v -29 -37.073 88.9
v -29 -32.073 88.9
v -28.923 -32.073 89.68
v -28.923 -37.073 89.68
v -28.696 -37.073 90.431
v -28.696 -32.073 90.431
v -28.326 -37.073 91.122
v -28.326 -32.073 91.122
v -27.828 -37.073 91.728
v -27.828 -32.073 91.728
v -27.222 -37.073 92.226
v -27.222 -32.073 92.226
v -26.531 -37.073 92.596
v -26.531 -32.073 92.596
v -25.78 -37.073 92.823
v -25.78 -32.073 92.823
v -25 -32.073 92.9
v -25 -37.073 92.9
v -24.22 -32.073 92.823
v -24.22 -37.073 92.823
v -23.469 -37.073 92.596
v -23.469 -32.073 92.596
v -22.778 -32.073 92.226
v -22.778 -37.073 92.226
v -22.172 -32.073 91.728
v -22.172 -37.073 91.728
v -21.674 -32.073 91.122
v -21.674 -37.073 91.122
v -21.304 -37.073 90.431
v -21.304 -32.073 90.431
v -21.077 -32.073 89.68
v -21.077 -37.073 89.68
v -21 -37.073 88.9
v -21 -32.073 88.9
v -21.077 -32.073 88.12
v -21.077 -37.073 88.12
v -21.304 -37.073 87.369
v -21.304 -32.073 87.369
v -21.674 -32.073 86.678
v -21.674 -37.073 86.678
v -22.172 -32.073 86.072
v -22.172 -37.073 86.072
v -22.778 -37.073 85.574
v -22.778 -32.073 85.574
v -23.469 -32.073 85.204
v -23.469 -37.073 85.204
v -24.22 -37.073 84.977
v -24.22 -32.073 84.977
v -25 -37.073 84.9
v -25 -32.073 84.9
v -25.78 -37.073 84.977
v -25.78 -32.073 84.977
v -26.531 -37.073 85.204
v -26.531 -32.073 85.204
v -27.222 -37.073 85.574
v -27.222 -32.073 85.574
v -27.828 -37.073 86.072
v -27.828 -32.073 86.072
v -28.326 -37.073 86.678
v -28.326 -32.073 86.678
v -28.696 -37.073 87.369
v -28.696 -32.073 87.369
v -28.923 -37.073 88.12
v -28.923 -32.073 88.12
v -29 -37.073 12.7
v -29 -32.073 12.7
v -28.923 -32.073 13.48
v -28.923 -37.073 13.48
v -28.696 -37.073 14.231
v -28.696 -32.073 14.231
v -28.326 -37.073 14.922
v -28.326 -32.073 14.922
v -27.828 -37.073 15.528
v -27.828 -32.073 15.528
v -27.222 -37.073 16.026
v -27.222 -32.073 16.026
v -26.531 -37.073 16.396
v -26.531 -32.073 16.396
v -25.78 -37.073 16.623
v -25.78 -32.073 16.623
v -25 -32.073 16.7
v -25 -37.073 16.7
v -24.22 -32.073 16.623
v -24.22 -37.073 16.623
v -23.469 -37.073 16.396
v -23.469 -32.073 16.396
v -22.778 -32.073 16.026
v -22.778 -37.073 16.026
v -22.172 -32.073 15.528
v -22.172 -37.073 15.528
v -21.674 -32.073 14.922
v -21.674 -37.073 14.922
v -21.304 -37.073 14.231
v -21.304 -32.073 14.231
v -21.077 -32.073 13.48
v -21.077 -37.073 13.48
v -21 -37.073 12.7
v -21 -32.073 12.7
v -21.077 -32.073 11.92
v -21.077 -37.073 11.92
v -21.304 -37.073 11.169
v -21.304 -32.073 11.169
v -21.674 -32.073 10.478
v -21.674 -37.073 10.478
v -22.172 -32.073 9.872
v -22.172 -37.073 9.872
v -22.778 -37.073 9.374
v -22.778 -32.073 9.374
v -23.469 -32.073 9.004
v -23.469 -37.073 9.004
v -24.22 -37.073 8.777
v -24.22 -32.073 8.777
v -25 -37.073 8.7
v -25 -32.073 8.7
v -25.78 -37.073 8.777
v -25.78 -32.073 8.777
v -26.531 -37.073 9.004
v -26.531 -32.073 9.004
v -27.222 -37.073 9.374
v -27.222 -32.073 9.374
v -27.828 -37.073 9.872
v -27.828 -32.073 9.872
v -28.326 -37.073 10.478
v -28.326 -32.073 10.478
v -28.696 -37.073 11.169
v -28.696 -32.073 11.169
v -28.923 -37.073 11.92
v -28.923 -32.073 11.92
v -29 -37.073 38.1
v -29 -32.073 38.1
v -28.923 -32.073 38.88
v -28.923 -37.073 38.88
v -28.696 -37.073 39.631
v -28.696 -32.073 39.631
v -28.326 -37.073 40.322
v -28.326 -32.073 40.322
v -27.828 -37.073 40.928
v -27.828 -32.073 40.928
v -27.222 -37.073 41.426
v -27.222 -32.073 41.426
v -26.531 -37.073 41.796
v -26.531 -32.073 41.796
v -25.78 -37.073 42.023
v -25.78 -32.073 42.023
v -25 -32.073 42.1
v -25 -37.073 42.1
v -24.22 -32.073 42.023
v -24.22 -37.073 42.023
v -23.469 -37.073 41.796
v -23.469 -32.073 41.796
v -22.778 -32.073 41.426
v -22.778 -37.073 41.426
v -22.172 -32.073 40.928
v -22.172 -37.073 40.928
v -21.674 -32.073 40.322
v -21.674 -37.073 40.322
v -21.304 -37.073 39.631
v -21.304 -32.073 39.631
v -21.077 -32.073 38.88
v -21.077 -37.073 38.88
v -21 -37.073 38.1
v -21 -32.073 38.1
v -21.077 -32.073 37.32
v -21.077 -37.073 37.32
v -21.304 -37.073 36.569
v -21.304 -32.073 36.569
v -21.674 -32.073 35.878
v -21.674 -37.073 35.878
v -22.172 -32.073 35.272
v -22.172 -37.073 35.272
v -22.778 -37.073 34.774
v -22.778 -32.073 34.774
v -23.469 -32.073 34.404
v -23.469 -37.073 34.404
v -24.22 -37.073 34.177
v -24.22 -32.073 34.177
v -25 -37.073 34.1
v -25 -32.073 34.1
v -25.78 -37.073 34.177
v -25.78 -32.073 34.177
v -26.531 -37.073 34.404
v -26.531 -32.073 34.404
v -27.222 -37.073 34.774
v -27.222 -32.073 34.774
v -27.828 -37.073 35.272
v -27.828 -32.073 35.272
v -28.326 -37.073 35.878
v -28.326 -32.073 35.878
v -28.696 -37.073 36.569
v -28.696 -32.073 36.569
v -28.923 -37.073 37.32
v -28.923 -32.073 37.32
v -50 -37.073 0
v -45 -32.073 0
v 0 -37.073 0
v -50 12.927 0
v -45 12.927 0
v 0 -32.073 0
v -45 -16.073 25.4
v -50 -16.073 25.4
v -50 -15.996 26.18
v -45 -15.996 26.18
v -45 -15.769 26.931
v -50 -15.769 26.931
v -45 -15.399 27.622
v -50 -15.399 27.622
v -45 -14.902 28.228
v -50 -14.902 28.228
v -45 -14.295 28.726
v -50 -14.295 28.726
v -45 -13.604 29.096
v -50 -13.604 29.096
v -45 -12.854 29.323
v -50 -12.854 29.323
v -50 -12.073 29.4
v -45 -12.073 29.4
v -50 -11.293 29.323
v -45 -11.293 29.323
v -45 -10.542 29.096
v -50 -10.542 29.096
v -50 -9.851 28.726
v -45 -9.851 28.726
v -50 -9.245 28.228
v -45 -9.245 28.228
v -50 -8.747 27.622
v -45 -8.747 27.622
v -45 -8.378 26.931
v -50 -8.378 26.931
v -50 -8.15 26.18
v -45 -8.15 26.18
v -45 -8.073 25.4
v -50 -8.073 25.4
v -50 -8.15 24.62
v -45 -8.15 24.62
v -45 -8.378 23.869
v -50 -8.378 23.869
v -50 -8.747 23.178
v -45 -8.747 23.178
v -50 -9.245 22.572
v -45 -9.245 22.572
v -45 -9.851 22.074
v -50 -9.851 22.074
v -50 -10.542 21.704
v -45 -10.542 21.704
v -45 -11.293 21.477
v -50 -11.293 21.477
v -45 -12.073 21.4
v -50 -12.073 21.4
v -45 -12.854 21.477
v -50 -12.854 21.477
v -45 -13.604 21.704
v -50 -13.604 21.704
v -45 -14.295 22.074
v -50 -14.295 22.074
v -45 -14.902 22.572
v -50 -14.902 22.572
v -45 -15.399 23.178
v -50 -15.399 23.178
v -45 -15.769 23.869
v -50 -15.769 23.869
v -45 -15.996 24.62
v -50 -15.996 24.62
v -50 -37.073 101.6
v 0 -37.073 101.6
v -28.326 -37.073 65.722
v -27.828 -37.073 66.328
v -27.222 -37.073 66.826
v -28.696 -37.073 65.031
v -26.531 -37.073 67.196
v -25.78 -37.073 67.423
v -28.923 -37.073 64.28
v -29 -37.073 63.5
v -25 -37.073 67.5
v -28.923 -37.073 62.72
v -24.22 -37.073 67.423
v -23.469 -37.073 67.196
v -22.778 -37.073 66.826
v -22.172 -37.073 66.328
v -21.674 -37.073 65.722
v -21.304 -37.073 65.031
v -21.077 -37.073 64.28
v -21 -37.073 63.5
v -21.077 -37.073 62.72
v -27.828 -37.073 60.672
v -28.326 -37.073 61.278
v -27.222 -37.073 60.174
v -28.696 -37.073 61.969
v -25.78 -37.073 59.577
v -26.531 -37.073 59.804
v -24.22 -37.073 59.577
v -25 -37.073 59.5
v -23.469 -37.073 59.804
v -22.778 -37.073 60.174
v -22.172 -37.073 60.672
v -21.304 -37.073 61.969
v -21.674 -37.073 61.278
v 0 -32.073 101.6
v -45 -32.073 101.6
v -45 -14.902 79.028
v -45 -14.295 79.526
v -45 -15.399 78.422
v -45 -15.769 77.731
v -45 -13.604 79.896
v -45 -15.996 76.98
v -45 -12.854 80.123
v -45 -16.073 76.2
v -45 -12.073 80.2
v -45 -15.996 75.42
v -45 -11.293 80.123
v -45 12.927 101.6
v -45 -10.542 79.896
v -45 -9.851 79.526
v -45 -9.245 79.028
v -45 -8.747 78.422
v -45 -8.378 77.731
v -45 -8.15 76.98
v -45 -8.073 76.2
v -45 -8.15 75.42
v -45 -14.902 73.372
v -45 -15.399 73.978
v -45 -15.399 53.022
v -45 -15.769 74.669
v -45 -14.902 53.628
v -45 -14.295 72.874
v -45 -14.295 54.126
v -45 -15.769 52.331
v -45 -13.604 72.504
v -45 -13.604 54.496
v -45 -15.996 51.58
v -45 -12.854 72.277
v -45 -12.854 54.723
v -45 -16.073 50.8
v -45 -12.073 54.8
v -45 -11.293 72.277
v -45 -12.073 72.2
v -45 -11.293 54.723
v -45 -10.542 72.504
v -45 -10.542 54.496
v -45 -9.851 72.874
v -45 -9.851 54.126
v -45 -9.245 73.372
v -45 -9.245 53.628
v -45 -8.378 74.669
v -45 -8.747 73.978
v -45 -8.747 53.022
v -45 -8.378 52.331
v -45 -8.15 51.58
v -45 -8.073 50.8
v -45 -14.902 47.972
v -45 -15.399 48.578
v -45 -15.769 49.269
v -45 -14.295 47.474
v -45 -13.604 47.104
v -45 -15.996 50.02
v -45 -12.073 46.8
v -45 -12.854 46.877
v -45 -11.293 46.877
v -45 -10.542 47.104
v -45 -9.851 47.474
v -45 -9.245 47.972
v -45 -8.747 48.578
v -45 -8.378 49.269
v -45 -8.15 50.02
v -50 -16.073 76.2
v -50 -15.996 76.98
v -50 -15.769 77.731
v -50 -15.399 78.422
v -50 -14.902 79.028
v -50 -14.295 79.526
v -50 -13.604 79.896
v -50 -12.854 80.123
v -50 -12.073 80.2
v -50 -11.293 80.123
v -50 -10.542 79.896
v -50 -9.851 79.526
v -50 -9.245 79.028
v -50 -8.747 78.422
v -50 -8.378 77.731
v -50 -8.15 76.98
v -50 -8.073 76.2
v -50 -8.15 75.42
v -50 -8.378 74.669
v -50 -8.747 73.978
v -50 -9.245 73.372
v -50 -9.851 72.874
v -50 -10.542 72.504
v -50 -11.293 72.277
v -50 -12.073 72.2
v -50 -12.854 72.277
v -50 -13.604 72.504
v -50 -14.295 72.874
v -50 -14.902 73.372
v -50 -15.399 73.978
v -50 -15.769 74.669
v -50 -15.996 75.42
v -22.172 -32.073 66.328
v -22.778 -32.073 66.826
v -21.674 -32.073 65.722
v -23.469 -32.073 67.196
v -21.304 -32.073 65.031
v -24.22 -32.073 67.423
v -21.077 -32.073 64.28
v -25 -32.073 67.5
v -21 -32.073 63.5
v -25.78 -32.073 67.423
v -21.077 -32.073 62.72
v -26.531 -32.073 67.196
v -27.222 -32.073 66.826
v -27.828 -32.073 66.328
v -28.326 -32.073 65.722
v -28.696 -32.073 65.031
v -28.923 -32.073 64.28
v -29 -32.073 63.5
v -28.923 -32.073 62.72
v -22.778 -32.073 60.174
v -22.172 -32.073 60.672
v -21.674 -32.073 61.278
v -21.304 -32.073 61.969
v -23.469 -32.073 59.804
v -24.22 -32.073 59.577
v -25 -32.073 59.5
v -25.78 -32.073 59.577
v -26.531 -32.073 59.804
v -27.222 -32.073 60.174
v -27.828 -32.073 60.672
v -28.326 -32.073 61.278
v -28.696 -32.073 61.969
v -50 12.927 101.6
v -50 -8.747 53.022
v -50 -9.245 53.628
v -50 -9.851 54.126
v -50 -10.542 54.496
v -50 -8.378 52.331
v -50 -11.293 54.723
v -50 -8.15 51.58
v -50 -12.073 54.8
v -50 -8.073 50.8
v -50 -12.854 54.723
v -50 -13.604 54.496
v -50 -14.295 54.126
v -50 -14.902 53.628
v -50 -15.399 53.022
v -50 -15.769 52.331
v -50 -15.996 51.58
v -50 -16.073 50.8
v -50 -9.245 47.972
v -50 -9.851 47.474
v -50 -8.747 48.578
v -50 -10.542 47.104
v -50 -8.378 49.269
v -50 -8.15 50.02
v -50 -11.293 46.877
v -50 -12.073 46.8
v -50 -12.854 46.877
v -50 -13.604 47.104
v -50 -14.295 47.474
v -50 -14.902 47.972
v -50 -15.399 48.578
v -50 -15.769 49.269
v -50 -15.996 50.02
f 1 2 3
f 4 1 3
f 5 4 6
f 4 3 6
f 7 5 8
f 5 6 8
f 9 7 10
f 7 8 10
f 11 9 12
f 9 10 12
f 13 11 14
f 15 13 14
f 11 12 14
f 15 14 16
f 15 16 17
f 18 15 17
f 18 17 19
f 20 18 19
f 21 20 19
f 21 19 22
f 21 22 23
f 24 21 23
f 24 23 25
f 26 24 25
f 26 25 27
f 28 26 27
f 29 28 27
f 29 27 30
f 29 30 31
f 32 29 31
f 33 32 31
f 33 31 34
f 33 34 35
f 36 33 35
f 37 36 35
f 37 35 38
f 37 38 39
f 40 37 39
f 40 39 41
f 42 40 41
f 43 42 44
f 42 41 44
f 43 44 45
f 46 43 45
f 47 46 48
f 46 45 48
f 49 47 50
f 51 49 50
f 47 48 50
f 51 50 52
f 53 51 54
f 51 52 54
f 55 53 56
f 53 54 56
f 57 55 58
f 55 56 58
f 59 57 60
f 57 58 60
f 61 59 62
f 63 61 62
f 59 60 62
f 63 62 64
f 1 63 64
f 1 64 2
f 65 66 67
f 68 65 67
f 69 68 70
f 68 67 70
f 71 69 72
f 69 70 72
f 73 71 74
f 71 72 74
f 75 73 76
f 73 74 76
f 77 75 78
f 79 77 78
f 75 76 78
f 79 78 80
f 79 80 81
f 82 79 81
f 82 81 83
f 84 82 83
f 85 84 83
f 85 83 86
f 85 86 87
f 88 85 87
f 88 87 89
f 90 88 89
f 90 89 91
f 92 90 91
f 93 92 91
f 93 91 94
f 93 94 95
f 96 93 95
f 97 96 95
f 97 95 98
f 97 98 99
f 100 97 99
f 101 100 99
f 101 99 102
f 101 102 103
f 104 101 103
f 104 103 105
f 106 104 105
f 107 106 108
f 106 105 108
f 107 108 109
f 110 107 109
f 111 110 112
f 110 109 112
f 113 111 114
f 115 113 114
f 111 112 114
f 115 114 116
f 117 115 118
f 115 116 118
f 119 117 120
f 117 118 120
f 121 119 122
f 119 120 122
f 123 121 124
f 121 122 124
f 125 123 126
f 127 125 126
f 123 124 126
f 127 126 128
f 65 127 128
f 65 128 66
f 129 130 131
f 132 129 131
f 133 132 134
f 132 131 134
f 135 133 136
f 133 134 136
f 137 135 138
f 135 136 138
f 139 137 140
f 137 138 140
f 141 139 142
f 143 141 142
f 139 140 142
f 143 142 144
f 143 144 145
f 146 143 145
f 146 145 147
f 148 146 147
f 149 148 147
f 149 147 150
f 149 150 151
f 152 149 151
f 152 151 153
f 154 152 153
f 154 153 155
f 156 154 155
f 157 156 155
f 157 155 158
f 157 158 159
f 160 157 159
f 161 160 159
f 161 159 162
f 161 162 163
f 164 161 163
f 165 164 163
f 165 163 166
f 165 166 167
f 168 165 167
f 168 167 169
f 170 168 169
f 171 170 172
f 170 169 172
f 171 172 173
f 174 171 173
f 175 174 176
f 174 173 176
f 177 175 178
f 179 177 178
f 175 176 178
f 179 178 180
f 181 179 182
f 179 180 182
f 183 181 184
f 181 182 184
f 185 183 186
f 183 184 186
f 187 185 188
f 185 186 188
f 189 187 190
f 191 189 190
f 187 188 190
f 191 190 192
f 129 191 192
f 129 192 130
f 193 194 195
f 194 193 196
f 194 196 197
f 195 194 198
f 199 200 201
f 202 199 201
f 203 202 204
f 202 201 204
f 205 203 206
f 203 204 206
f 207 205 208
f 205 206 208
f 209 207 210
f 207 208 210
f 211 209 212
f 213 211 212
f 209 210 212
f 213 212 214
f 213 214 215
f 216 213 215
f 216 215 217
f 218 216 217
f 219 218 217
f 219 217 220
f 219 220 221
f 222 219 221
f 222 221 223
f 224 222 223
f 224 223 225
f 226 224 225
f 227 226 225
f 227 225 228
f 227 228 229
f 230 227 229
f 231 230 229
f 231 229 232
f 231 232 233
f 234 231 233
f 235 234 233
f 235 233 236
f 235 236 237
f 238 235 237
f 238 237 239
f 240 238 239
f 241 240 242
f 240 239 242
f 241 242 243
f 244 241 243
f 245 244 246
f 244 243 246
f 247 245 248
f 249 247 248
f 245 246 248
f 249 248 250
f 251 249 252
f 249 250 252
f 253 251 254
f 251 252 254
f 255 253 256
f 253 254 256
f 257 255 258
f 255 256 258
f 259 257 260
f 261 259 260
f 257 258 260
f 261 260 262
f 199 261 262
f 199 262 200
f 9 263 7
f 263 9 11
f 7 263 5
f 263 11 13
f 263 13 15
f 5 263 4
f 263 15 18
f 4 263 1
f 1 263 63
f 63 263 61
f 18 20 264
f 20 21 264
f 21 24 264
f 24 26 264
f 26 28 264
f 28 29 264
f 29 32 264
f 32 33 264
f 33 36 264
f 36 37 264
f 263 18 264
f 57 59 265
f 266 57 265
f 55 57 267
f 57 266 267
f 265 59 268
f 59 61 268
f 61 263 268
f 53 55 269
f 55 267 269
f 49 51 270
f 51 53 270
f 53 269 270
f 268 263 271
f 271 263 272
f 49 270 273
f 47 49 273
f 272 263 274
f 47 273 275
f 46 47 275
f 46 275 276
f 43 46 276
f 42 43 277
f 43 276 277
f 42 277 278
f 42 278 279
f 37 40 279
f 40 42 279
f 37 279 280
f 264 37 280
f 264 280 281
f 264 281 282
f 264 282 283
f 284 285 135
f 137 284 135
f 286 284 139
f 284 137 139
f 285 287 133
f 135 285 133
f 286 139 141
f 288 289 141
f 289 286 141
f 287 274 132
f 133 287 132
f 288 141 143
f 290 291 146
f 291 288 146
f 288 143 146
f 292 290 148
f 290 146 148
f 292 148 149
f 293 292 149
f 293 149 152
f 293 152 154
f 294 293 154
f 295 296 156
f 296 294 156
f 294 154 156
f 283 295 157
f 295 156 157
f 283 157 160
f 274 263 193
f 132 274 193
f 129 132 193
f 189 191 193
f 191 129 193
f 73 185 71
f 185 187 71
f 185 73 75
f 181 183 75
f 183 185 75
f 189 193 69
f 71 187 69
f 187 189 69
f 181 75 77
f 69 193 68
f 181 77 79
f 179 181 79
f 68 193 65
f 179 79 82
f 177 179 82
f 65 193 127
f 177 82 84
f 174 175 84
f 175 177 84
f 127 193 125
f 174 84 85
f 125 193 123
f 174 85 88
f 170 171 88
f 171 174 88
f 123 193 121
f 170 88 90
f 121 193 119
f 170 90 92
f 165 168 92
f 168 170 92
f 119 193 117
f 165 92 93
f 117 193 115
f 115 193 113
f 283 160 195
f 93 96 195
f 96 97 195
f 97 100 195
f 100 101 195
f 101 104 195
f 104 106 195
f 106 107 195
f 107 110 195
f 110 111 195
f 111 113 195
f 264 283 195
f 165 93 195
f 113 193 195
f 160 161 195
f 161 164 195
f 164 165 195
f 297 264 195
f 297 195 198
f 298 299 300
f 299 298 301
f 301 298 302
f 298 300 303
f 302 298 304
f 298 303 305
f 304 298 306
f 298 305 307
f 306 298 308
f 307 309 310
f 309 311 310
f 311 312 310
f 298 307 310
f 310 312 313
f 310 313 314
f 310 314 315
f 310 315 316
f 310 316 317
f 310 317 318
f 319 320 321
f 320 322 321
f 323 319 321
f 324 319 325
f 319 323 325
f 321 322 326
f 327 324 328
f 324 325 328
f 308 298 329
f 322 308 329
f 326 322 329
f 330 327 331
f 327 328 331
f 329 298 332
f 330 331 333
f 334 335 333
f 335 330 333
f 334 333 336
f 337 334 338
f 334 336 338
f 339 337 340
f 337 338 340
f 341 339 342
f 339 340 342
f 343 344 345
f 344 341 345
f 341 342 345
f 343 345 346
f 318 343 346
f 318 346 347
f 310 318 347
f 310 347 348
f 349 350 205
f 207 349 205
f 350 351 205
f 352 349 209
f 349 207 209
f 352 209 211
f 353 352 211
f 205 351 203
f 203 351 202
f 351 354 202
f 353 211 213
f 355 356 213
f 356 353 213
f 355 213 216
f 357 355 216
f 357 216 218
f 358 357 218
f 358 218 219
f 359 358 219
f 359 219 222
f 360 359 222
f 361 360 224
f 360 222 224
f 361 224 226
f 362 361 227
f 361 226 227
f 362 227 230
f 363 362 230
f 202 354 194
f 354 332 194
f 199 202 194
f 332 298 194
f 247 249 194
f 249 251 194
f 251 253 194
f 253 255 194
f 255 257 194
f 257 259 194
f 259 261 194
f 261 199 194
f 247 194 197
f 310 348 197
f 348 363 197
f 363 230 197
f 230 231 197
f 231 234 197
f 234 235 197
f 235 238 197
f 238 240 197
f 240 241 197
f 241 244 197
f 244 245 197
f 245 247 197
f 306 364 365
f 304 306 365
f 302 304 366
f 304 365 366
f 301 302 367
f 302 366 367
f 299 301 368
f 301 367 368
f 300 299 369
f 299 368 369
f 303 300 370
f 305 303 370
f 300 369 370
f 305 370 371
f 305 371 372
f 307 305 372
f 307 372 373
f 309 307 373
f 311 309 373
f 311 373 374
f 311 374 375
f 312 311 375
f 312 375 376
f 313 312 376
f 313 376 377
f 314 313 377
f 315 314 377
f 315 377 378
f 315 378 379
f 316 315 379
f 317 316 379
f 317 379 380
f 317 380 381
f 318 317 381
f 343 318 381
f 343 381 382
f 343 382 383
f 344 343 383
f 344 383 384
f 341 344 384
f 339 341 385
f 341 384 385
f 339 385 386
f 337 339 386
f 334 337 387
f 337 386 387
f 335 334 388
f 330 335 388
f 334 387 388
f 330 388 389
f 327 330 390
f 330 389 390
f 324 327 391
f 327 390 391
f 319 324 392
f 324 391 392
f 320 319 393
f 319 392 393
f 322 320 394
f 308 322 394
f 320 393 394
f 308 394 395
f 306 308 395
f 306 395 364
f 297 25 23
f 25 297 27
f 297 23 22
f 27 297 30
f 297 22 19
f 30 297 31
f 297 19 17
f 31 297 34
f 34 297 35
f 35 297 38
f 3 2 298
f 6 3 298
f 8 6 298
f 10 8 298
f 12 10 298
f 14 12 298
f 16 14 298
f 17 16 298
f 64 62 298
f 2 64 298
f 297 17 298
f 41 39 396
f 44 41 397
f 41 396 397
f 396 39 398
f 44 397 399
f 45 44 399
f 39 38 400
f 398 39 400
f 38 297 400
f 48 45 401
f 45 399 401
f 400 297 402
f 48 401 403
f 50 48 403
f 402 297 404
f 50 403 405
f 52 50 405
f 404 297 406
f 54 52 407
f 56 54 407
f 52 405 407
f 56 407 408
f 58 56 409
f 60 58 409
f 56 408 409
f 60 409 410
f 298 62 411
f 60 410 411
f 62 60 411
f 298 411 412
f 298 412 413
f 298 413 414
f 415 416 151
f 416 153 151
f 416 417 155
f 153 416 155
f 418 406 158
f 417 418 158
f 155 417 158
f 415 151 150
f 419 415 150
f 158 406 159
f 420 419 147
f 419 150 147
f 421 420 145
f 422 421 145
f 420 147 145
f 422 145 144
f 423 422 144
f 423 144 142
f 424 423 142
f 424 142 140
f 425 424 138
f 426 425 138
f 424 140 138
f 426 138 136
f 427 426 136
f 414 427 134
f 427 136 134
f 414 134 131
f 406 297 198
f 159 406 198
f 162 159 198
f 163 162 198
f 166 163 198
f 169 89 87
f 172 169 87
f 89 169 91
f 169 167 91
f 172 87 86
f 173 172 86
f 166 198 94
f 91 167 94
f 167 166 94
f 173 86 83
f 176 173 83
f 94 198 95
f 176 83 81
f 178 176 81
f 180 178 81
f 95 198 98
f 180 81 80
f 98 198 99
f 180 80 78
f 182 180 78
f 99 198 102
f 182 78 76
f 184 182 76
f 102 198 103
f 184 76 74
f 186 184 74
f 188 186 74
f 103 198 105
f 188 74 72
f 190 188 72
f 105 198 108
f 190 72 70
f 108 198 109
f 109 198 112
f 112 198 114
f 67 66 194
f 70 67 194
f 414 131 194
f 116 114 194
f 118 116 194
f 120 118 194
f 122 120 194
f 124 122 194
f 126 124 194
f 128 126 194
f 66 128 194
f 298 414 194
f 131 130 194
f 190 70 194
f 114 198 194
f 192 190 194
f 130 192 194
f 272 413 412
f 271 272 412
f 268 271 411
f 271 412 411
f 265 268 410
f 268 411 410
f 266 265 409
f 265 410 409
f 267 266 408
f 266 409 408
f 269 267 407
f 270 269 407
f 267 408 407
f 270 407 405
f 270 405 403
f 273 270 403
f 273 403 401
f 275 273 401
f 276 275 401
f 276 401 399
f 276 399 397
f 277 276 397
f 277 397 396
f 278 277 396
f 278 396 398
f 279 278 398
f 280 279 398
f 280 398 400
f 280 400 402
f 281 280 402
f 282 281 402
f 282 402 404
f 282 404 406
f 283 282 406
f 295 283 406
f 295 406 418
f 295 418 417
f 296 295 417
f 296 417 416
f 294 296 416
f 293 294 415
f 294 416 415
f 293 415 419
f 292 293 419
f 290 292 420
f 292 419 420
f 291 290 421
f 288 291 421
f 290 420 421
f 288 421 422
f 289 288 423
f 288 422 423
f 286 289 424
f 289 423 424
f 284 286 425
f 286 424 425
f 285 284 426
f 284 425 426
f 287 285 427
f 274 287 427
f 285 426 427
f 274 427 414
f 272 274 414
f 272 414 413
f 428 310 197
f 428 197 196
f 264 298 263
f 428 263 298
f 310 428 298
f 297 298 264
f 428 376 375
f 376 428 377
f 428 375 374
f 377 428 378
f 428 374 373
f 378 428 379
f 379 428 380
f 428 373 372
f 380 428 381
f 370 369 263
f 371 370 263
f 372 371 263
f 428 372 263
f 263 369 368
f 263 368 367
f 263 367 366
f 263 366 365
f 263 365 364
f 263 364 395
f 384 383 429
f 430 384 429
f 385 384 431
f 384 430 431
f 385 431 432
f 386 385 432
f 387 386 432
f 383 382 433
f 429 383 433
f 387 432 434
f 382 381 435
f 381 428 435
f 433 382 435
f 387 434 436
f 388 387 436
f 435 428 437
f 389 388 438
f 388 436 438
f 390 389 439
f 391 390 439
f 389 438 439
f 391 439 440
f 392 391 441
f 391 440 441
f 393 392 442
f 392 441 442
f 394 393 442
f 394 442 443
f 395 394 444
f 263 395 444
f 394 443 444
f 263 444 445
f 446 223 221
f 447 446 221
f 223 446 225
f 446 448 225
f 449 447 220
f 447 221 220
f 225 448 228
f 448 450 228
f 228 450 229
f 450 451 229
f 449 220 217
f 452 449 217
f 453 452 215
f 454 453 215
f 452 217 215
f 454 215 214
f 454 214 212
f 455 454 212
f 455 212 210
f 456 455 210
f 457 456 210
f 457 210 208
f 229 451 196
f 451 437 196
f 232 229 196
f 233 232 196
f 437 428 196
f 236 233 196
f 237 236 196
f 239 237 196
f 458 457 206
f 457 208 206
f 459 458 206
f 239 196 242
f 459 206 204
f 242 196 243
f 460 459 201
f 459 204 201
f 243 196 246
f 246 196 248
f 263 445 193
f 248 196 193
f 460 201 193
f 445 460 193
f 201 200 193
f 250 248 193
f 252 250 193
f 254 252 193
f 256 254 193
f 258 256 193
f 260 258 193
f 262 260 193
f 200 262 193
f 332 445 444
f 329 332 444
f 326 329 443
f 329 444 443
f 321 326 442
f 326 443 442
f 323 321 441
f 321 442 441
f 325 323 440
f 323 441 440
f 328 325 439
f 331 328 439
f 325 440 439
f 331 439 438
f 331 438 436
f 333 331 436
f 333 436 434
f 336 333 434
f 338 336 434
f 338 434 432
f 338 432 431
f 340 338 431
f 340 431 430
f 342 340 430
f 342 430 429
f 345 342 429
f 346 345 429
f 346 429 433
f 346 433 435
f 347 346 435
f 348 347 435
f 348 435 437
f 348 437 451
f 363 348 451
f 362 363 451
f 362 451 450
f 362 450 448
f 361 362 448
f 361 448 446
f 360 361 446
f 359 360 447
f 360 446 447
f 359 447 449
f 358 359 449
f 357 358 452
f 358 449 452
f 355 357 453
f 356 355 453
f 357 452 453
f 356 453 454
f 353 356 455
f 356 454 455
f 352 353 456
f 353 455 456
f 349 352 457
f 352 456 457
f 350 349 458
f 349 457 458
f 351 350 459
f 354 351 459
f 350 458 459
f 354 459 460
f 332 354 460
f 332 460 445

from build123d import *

# Parameters (mm, degrees)
F1_DEPTH = 101.6
F2_R     = 4
F3_DEPTH = 25
F5_D     = 8


with BuildPart() as f1:
    # F0 (on Top) → F1 (new body)
    with BuildSketch(Plane.XY):
        Polygon((-45, 12.9268298003), (-50, 12.9268298003), (-50, -37.0731701997), (0, -37.0731701997), (0, -32.0731701997), (-45, -32.0731701997), align=None)
    extrude(amount=F1_DEPTH)

    # F2 (on face) → F3 (cut)
    with BuildSketch(Plane(origin=(-50, 0, 0), x_dir=(0, -1, 0), z_dir=(-1, 0, 0))):
        with Locations((12.0731701997, 76.2)):
            Circle(F2_R)
        with Locations((12.0731701997, 50.8)):
            Circle(F2_R)
        with Locations((12.0731701997, 25.4)):
            Circle(F2_R)
    extrude(amount=-F3_DEPTH, mode=Mode.SUBTRACT)

    # F5 (through all)
    with Locations(Plane.XZ.offset(37.0731701997)):
        with Locations((-25, 88.9), (-25, 63.5), (-25, 38.1), (-25, 12.7)):
            Hole(F5_D / 2)


solid = f1.part
